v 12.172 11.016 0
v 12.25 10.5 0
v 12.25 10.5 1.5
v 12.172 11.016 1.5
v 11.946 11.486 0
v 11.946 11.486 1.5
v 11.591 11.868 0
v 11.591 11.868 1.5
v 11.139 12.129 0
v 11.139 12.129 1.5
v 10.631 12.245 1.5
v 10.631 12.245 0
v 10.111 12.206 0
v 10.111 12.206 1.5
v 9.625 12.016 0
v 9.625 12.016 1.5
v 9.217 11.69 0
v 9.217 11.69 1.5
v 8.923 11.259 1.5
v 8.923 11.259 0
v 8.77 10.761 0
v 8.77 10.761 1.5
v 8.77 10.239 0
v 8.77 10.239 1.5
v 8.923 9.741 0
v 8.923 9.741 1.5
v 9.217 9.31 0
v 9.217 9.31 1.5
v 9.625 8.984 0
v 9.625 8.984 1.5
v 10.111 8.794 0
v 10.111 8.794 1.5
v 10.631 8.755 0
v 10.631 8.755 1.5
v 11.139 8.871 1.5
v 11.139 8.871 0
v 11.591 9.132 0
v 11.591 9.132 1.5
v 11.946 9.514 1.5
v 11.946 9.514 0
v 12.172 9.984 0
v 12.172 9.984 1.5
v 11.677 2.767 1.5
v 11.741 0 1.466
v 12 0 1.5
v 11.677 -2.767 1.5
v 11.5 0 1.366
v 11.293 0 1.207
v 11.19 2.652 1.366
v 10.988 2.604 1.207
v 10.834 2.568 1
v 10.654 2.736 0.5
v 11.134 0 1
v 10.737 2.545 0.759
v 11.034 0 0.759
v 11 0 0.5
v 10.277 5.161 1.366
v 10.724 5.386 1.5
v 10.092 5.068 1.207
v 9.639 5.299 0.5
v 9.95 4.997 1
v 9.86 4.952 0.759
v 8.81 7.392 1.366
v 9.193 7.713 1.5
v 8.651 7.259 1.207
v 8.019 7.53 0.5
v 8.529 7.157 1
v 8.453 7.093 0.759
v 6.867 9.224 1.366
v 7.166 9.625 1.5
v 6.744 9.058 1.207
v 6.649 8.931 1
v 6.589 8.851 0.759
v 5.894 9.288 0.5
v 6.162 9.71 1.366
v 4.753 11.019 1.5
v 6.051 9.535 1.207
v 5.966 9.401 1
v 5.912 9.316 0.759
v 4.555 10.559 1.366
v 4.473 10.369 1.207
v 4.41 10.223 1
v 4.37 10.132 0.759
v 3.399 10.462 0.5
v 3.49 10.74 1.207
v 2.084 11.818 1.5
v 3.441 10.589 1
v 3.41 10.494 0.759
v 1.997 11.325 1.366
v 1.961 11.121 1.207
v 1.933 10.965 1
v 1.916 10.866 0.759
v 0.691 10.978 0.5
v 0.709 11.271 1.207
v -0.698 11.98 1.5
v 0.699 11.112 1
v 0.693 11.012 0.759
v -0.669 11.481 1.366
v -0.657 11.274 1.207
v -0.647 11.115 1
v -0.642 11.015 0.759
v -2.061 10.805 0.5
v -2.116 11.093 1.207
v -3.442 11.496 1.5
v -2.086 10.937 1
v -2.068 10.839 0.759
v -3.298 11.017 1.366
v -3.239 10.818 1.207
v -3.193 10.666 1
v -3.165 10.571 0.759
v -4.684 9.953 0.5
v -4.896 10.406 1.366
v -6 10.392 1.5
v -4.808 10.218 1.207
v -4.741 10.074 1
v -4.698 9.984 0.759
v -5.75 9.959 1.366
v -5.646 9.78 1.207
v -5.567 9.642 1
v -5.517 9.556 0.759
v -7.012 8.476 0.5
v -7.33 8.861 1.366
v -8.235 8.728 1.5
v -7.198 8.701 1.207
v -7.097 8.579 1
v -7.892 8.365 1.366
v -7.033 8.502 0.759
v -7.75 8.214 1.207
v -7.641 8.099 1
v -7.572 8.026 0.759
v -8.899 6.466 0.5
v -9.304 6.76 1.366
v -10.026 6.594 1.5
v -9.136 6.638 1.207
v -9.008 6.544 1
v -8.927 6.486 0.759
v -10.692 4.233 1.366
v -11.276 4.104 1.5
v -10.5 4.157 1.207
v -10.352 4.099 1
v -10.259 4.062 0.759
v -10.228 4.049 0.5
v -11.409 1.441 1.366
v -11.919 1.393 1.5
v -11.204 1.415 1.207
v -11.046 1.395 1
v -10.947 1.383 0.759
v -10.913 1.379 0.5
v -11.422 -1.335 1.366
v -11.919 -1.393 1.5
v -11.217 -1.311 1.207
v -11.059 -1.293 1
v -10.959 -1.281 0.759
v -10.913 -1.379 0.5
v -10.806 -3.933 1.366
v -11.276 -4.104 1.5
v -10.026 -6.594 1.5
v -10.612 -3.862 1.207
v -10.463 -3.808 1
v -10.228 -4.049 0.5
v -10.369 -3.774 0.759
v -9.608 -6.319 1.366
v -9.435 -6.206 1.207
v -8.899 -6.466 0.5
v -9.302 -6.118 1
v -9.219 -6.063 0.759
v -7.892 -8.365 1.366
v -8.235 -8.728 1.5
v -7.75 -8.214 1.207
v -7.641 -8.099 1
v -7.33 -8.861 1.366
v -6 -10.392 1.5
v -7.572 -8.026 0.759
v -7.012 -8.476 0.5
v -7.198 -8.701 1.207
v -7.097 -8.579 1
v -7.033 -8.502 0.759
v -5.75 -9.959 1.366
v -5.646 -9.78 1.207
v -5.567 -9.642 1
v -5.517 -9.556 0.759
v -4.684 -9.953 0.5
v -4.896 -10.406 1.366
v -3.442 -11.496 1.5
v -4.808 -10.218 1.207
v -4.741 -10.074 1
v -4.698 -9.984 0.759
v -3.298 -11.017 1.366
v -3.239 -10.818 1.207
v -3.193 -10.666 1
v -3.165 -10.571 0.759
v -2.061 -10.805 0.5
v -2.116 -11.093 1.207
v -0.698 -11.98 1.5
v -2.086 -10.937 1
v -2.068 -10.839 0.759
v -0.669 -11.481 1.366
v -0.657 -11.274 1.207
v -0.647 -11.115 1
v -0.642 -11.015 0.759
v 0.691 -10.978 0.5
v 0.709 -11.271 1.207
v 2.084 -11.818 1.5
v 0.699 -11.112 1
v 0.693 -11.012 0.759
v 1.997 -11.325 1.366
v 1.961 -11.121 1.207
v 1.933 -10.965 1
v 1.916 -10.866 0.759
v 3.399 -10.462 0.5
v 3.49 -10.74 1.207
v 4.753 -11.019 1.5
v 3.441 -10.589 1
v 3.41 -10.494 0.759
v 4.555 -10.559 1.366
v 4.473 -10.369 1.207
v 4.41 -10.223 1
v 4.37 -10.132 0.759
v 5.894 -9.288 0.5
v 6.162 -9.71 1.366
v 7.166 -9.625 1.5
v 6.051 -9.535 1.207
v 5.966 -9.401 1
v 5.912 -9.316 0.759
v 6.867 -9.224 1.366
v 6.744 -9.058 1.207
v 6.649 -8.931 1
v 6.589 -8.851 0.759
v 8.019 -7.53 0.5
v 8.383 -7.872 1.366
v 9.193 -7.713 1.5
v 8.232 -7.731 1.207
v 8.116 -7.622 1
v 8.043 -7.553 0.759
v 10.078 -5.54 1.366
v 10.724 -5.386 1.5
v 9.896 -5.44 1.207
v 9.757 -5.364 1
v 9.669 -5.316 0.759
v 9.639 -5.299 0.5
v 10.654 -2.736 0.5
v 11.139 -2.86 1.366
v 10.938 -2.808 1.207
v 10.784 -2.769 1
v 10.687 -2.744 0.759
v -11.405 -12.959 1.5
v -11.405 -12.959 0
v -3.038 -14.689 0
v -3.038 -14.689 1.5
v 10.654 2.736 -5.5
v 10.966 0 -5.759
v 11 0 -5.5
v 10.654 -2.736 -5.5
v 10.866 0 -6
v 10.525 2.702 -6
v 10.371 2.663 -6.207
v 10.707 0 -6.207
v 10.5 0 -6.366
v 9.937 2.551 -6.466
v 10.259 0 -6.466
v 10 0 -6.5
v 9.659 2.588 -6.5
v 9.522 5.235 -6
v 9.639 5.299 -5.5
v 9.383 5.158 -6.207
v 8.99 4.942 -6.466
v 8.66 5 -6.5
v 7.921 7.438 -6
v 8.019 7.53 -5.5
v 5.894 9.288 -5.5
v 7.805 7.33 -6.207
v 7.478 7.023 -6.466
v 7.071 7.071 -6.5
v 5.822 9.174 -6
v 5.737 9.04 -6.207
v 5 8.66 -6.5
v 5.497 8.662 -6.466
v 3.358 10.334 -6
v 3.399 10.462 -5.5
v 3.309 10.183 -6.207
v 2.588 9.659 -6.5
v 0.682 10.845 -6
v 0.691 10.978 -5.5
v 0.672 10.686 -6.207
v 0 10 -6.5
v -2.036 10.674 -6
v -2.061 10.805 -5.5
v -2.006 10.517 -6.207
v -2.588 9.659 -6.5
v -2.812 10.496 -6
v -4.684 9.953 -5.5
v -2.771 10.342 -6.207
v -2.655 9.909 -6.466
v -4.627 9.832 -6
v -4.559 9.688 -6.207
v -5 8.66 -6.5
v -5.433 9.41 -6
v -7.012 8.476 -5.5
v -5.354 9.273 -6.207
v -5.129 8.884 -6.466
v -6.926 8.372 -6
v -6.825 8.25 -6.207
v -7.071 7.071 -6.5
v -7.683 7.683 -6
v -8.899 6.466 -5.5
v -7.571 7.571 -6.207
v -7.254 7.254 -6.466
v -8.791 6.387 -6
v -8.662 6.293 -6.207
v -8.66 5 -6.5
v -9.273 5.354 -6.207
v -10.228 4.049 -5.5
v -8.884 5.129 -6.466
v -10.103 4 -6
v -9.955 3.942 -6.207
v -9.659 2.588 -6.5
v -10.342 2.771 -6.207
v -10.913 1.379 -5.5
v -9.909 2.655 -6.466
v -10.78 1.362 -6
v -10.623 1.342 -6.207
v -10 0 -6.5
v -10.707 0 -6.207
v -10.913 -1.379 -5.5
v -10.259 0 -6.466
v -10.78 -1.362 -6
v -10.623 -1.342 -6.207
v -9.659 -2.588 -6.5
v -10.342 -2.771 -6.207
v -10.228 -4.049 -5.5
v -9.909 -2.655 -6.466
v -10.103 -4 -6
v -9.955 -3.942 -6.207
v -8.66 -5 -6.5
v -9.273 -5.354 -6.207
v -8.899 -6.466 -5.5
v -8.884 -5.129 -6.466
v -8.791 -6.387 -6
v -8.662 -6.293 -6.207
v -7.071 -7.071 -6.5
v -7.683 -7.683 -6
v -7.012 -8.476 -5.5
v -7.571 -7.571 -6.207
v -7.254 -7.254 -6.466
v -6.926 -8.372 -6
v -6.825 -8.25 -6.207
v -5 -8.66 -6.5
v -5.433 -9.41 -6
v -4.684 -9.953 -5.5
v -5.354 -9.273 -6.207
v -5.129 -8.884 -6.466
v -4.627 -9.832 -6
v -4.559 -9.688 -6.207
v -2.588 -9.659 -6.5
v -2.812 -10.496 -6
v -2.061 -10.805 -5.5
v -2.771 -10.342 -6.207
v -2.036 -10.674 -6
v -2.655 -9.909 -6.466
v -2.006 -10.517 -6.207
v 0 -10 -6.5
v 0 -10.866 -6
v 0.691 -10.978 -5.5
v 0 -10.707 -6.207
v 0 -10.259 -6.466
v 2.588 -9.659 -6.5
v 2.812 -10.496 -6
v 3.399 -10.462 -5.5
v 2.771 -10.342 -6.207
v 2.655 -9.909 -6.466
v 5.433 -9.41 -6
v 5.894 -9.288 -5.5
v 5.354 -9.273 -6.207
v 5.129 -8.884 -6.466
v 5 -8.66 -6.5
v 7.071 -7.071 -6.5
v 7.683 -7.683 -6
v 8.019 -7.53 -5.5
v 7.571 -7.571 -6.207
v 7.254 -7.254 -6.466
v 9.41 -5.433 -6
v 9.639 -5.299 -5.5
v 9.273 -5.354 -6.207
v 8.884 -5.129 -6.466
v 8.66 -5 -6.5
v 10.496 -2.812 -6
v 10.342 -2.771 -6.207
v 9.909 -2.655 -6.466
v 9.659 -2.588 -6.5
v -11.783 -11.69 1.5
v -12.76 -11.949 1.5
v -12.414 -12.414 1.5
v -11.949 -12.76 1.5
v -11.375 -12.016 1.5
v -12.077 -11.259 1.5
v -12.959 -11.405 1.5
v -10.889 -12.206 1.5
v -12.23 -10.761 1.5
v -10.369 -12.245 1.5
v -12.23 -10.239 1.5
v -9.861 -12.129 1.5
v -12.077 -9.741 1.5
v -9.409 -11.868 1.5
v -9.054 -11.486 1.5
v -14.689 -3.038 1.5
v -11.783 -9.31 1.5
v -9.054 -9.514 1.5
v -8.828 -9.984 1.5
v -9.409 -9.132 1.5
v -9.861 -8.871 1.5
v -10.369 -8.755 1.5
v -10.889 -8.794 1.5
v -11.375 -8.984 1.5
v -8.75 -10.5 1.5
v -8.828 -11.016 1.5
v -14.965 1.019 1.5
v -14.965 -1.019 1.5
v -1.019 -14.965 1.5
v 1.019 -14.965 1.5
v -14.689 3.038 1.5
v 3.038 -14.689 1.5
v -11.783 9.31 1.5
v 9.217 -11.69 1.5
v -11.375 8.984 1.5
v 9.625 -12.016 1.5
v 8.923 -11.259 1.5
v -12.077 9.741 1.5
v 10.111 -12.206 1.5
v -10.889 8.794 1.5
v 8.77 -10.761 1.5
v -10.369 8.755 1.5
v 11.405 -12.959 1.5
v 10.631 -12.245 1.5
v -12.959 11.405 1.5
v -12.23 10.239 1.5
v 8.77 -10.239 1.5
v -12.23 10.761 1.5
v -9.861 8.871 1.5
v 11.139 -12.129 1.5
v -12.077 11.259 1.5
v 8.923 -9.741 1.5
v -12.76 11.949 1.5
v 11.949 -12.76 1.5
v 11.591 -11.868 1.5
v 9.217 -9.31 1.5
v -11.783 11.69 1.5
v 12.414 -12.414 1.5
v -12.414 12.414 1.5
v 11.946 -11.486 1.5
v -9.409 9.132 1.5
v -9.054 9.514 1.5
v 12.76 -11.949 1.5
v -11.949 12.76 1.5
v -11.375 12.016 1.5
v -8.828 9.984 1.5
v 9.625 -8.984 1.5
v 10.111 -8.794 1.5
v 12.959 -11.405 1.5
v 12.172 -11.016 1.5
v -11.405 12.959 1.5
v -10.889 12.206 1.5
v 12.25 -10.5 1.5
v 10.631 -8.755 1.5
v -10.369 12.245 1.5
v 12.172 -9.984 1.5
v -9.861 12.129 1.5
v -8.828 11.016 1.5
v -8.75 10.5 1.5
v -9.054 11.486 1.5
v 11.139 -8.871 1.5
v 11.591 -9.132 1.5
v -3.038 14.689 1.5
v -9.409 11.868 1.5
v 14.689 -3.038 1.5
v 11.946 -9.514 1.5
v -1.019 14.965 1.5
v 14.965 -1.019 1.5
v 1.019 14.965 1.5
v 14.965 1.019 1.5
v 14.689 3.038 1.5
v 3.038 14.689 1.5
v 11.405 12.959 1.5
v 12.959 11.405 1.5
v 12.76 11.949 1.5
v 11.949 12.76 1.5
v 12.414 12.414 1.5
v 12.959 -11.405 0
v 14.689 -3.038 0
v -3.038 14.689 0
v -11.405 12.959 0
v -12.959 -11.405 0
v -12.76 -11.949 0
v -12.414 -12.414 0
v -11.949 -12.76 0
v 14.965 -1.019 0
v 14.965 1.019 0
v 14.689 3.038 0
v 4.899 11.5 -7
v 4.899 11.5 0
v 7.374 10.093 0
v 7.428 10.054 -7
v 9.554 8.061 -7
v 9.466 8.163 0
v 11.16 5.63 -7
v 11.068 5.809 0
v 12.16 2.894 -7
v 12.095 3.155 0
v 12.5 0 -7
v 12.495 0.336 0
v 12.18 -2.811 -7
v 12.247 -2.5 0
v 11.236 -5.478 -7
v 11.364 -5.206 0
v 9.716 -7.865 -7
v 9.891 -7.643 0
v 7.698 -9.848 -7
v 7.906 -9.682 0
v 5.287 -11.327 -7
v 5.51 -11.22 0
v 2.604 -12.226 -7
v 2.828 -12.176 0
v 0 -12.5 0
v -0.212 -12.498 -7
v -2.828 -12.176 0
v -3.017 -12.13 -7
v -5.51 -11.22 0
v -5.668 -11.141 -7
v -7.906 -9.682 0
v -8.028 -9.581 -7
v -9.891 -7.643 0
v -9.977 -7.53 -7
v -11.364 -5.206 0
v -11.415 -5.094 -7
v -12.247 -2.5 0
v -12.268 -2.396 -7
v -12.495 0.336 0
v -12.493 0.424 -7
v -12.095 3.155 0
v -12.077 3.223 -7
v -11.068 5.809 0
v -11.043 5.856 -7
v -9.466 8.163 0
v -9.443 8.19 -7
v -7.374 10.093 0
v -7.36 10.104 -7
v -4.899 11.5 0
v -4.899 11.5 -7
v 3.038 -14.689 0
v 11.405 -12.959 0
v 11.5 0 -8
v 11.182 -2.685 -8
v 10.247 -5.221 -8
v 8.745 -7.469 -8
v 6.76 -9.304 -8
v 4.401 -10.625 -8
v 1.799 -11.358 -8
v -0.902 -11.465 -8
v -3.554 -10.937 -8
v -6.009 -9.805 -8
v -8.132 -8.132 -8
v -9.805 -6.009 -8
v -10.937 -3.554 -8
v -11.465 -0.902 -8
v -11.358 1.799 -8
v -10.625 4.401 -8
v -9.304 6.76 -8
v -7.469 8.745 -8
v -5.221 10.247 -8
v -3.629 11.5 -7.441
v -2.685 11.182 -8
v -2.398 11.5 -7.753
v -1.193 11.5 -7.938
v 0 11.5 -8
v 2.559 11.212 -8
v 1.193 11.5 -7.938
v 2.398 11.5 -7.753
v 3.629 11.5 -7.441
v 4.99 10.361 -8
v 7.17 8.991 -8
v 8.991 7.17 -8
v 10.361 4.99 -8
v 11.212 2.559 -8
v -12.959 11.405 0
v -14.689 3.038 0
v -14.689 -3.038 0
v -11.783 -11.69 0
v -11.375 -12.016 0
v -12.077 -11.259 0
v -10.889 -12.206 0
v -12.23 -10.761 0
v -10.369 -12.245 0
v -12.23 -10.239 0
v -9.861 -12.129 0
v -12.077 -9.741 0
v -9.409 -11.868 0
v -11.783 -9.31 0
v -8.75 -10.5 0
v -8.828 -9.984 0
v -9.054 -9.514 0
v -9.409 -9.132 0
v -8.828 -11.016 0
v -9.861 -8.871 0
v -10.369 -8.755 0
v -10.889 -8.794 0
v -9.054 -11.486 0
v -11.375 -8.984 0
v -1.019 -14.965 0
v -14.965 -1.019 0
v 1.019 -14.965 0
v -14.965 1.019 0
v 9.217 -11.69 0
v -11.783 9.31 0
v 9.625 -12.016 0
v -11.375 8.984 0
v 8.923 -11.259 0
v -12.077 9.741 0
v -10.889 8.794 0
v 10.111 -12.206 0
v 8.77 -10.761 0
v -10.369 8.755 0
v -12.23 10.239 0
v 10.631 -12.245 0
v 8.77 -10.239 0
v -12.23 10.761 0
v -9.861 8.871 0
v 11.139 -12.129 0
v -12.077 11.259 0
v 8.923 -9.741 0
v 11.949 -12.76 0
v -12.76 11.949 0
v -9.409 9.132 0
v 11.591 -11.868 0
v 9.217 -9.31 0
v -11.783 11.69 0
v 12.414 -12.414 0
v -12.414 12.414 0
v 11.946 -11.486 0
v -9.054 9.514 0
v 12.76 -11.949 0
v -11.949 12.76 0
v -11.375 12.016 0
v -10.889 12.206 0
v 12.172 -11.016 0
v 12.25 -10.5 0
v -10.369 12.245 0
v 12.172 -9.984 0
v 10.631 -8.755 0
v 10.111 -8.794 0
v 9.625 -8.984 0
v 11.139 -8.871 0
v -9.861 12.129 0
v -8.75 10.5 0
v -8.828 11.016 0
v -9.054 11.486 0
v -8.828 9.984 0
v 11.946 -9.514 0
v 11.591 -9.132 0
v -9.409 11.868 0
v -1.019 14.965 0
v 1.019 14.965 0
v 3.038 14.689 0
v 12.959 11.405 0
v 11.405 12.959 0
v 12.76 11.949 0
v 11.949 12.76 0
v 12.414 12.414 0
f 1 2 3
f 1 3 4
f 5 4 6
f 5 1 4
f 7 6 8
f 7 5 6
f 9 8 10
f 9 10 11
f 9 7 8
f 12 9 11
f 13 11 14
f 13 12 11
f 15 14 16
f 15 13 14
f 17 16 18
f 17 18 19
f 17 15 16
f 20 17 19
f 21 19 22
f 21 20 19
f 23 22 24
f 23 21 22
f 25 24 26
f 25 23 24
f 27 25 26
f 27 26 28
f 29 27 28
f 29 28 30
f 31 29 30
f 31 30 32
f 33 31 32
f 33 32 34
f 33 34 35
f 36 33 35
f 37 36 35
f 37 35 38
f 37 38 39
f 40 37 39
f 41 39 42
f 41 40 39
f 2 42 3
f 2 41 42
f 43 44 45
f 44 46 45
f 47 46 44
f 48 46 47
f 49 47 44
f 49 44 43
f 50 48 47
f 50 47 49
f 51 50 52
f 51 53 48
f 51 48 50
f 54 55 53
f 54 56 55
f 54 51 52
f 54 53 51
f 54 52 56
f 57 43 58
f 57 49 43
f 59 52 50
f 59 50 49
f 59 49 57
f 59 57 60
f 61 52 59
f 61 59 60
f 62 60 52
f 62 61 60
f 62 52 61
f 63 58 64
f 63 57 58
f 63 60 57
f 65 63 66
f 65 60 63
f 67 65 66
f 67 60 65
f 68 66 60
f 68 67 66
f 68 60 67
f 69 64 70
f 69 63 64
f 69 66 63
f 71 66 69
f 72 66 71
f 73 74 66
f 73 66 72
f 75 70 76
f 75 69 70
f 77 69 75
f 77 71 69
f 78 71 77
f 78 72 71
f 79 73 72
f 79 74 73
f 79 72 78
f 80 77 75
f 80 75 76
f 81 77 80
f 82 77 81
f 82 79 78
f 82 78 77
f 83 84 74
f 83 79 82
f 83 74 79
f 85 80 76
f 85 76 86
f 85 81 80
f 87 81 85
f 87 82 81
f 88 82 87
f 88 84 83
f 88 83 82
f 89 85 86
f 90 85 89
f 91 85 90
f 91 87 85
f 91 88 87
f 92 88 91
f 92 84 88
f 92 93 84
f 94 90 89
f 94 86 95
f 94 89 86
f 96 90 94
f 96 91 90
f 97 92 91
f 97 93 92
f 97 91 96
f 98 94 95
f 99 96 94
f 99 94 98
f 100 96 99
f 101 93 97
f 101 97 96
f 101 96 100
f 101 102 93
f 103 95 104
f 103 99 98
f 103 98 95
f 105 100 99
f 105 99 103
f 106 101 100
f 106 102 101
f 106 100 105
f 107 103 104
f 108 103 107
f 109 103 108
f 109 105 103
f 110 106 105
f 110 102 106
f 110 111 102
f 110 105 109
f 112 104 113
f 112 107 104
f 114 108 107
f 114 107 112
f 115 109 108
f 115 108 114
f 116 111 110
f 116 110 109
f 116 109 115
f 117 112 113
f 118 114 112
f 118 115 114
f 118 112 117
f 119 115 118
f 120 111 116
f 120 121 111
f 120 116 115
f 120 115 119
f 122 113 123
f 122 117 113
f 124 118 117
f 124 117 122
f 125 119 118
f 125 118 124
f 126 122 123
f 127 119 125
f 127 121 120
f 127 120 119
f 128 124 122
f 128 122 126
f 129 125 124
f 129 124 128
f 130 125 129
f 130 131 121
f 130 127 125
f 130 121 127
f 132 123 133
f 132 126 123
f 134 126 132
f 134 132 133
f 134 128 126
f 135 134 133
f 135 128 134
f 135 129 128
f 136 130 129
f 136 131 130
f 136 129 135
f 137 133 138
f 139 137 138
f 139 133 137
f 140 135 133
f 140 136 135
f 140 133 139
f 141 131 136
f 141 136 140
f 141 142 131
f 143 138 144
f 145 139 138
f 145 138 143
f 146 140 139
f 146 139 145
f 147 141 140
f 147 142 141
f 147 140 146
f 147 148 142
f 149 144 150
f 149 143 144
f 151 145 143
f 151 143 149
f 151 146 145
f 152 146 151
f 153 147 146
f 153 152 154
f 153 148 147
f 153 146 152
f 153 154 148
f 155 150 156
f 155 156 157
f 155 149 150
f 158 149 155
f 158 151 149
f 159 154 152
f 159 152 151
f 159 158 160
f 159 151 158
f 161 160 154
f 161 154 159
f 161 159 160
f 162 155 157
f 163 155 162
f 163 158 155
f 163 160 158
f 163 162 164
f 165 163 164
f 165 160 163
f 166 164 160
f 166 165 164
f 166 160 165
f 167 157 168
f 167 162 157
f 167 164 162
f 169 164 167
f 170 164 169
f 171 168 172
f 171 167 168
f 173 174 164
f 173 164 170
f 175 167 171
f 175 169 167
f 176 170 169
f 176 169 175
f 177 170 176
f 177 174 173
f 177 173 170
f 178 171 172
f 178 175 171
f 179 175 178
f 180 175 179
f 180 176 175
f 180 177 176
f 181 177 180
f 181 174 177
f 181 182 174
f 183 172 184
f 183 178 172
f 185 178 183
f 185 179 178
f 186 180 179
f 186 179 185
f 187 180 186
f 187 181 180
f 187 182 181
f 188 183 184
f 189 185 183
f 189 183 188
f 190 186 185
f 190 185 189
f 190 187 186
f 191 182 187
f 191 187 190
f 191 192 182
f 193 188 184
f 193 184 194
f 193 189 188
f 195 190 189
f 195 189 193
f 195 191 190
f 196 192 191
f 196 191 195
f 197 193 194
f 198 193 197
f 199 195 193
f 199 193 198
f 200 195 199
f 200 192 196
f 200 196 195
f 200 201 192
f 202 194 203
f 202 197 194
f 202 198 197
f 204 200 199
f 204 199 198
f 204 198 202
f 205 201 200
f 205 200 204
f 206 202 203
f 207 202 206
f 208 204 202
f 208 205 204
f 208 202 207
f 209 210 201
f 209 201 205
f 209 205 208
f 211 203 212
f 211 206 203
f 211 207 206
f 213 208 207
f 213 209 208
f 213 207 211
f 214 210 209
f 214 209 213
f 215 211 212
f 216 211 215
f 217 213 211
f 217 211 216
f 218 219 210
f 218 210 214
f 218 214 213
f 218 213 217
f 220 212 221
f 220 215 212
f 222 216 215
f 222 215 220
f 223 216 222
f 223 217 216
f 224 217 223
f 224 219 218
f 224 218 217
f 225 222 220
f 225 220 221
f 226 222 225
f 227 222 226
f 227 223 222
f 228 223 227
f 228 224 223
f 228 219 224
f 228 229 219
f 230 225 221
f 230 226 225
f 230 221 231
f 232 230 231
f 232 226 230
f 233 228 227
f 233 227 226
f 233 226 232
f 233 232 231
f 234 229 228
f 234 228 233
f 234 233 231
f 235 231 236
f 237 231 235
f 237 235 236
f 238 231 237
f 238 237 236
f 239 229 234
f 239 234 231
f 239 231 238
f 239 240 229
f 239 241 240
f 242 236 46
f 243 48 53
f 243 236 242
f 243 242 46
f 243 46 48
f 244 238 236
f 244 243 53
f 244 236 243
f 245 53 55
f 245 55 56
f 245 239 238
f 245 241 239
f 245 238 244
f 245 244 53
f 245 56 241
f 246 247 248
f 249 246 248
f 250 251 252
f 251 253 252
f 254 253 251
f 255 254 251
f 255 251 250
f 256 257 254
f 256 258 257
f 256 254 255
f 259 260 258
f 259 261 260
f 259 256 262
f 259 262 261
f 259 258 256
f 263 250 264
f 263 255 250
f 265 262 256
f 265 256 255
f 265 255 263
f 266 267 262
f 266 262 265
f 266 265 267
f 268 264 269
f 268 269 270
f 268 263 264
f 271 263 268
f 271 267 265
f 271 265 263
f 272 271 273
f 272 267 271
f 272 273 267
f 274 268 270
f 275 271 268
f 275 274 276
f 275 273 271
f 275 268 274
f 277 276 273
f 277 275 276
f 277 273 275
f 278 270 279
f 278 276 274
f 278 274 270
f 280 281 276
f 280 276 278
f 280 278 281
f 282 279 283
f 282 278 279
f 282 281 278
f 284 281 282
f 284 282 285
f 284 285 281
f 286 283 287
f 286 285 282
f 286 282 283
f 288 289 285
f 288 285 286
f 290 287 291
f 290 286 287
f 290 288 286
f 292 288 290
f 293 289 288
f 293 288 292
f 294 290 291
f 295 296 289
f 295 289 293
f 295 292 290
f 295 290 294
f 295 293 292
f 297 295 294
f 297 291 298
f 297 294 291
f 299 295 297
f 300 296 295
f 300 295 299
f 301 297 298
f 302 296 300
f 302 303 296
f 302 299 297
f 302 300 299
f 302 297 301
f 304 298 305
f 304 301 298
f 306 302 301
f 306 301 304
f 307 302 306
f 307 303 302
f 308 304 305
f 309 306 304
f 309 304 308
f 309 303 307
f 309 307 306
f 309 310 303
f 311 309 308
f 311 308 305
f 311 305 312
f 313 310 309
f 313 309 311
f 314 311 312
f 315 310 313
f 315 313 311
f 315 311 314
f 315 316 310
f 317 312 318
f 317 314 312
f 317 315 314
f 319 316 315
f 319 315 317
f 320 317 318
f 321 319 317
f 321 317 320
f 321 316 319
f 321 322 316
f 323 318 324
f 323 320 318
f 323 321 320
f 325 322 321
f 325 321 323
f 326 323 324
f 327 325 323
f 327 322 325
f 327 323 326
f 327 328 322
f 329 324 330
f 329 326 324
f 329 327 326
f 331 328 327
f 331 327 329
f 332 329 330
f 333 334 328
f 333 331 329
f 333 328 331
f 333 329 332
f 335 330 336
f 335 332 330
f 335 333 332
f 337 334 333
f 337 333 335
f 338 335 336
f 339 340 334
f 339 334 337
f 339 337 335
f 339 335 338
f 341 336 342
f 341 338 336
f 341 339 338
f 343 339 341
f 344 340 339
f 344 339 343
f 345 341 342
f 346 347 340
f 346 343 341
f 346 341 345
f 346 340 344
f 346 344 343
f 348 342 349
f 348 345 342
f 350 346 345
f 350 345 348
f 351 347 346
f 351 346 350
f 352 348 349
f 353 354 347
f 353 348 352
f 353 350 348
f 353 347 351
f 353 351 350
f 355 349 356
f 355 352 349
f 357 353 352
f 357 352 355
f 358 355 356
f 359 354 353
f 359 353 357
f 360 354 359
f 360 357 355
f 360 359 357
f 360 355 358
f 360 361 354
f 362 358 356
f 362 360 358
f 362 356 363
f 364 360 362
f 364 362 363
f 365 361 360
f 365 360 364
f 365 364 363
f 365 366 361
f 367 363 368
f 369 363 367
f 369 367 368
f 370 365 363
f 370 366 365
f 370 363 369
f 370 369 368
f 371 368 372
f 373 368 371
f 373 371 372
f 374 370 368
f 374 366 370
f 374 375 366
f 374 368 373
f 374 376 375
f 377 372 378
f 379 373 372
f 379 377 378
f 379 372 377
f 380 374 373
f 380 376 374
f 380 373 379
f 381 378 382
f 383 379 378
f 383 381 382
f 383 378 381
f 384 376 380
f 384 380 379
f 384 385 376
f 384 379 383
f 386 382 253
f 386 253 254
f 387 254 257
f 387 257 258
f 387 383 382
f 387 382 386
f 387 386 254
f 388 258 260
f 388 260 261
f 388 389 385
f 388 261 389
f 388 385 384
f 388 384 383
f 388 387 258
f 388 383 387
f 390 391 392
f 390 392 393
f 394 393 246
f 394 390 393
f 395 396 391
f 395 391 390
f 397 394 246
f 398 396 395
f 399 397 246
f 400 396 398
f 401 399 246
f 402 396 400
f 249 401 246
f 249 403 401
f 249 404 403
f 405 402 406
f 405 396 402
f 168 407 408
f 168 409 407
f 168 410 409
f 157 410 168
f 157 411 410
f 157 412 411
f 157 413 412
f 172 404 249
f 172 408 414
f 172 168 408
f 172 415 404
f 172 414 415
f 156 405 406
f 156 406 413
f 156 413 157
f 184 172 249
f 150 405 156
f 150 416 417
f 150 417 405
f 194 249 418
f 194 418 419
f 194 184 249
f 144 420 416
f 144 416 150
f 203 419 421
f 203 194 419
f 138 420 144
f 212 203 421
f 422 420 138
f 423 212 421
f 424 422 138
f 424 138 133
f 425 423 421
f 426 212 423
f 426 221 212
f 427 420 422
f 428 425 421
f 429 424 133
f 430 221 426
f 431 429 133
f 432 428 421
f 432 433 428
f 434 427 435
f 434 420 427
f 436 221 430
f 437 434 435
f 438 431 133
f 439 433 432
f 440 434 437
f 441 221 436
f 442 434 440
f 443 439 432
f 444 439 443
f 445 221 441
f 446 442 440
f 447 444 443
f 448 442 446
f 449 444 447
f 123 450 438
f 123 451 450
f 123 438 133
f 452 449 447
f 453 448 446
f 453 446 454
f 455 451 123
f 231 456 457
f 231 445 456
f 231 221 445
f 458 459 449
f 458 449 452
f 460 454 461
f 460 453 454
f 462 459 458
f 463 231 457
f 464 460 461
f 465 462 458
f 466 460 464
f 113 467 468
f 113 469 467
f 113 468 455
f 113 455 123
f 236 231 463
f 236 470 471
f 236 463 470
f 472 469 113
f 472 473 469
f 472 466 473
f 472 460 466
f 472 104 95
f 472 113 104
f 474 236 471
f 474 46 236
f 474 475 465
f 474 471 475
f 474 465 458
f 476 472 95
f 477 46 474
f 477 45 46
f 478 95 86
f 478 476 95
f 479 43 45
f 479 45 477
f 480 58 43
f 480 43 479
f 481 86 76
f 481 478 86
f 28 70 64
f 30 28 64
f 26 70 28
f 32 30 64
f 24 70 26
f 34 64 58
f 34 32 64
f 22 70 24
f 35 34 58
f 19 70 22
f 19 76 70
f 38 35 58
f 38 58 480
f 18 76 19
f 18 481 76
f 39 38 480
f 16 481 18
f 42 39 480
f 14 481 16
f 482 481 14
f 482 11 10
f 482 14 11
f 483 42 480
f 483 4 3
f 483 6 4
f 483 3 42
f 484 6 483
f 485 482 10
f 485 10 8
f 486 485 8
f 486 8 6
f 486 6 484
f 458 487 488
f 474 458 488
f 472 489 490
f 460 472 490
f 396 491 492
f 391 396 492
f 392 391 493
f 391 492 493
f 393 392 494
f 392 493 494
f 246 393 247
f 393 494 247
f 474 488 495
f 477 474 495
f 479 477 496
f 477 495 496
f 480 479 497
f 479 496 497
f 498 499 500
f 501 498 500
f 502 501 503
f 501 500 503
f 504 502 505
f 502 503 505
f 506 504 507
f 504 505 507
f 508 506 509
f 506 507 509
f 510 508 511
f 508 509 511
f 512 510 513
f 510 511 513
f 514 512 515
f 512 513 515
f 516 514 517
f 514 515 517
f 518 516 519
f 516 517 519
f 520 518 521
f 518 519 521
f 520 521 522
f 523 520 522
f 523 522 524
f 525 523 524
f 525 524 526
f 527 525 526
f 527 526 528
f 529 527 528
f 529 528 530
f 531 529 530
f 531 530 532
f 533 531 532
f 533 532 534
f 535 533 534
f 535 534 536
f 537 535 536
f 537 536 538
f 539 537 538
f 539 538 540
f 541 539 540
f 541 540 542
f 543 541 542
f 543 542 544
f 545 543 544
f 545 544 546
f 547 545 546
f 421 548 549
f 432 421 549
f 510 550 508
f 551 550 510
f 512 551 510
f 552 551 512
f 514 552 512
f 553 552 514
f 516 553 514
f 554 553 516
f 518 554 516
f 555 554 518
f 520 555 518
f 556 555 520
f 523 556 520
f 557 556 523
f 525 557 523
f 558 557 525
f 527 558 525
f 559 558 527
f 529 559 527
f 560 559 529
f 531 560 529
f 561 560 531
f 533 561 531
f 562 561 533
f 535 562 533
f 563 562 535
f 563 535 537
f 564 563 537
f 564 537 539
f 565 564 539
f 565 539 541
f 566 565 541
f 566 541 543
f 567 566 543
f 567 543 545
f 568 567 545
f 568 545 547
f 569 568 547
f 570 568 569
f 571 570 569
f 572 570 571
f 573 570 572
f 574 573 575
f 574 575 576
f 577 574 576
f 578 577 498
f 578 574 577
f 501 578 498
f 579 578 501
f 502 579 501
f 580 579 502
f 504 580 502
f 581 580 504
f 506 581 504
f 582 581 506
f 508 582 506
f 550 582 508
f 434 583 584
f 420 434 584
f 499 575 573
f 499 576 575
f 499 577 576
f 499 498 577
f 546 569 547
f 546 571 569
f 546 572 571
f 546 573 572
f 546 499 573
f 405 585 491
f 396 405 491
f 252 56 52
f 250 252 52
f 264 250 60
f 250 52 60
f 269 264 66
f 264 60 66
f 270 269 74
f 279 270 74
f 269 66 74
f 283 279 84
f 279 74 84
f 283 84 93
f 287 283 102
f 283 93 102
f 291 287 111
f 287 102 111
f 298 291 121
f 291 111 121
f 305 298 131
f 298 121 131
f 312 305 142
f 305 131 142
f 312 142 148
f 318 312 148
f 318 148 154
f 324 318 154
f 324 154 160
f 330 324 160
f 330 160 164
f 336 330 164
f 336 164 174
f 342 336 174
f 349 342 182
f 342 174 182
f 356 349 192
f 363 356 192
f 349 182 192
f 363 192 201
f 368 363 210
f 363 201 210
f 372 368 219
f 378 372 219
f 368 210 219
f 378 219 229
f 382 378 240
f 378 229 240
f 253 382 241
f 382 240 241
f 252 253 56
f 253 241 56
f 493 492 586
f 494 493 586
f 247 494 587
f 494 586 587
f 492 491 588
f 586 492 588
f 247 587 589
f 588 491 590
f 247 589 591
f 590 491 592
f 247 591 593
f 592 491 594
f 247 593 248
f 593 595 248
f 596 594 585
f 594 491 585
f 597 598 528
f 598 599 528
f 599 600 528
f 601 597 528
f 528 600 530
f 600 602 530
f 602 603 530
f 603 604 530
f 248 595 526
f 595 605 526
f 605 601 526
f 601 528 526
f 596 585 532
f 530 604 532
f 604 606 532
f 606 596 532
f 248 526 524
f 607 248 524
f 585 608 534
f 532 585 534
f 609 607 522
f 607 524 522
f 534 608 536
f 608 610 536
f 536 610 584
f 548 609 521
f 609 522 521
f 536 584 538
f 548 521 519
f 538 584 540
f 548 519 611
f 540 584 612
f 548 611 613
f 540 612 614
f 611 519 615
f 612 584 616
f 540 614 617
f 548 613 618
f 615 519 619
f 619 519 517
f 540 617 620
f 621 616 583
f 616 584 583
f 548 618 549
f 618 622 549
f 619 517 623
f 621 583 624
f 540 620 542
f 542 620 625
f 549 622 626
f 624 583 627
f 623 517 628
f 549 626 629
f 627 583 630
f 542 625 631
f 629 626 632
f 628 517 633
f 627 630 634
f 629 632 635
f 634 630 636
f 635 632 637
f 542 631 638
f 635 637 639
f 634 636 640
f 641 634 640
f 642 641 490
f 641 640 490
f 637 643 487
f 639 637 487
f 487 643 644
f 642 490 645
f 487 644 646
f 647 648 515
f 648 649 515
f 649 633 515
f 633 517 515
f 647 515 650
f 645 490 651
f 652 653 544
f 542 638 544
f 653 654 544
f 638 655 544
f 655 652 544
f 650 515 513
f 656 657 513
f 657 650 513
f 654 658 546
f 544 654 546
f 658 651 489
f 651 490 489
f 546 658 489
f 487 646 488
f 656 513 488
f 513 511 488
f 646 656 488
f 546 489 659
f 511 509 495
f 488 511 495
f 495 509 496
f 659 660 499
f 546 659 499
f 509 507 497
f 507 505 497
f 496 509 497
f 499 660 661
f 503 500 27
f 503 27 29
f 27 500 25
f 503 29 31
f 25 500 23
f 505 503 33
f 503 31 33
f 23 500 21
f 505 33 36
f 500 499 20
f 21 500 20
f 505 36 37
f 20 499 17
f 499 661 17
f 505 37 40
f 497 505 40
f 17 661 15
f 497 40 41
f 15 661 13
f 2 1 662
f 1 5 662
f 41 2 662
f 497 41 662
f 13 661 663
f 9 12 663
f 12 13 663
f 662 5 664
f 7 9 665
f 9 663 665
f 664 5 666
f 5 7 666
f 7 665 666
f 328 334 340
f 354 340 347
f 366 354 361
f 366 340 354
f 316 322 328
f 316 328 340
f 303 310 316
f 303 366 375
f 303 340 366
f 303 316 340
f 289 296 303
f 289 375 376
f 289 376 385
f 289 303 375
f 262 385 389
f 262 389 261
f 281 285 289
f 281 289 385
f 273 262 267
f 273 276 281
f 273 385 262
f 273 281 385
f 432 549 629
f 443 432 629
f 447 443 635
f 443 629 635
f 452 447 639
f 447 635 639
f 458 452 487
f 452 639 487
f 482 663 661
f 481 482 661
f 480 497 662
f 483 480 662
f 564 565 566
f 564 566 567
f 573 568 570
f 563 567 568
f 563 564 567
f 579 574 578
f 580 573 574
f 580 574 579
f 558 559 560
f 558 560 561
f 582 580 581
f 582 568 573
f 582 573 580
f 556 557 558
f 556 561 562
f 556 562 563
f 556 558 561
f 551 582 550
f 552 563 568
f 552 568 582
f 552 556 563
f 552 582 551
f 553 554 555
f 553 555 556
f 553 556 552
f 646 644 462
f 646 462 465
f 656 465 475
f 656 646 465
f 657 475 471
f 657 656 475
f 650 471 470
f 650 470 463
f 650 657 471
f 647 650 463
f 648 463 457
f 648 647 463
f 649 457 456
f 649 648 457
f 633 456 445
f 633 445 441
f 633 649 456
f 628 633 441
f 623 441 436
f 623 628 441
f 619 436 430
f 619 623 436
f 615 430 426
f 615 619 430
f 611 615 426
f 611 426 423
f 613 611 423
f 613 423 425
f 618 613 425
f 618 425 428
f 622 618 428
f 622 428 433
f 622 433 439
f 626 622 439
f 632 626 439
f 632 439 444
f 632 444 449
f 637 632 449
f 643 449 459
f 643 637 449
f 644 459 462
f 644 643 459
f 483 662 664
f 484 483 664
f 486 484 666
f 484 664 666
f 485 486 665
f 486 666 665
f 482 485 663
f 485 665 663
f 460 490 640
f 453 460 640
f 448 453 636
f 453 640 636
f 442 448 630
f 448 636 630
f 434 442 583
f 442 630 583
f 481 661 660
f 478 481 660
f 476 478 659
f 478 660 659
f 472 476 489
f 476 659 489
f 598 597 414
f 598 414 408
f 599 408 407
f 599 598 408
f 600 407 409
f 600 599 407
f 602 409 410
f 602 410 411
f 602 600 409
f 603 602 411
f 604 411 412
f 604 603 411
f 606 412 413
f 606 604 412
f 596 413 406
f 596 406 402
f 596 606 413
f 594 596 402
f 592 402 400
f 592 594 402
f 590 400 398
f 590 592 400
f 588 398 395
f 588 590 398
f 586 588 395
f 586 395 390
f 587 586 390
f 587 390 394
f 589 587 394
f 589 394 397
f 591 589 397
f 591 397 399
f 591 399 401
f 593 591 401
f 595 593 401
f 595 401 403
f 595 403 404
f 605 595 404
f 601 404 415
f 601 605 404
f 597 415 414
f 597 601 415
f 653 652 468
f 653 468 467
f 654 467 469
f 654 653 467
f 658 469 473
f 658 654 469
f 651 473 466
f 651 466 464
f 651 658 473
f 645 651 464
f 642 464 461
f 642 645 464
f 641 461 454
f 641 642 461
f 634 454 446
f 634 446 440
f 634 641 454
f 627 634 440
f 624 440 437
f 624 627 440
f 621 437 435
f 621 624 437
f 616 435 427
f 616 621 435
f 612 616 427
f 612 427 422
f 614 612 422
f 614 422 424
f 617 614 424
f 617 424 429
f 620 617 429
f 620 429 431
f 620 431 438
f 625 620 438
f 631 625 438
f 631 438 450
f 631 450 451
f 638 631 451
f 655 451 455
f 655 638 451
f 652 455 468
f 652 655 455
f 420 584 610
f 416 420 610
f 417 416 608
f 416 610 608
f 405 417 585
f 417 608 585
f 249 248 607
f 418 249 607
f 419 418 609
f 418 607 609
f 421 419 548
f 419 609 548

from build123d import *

# Parameters (mm, degrees)
ESQUISSE1_R             = 1.75
BASE_EXTRUSION_DEPTH    = 1.5
ESQUISSE2_R             = 12.5
BOSS_EXTRU_1_DEPTH      = 8
CHANFREIN1_SIZE         = 1
ESQUISSE3_R             = 11
ENL_V_MAT_EXTRU_1_DEPTH = 8
CONG_1_R                = 1
ESQUISSE4_W             = 15.143469624
ESQUISSE4_H             = 5.581450233
ENL_V_MAT_EXTRU_3_DEPTH = 8


with BuildPart() as part:
    # Esquisse1 → Base-Extrusion (new body)
    with BuildSketch(Plane.XY):
        with BuildLine():
            Line((-11.405090569, -12.958545795), (-3.038179265, -14.689093463))
            ThreePointArc((-3.038179265, -14.689093463), (0, -15), (3.038179265, -14.689093463))
            Line((3.038179265, -14.689093463), (11.405090569, -12.958545795))
            ThreePointArc((11.405090569, -12.958545795), (12.414213562, -12.414213562), (12.958545795, -11.405090569))
            Line((12.958545795, -11.405090569), (14.689093463, -3.038179265))
            ThreePointArc((14.689093463, -3.038179265), (15, 0), (14.689093463, 3.038179265))
            Line((14.689093463, 3.038179265), (12.958545795, 11.405090569))
            ThreePointArc((12.958545795, 11.405090569), (12.414213562, 12.414213562), (11.405090569, 12.958545795))
            Line((11.405090569, 12.958545795), (3.038179265, 14.689093463))
            ThreePointArc((3.038179265, 14.689093463), (0, 15), (-3.038179265, 14.689093463))
            Line((-3.038179265, 14.689093463), (-11.405090569, 12.958545795))
            ThreePointArc((-11.405090569, 12.958545795), (-12.414213562, 12.414213562), (-12.958545795, 11.405090569))
            Line((-12.958545795, 11.405090569), (-14.689093463, 3.038179265))
            ThreePointArc((-14.689093463, 3.038179265), (-15, 0), (-14.689093463, -3.038179265))
            Line((-14.689093463, -3.038179265), (-12.958545795, -11.405090569))
            ThreePointArc((-12.958545795, -11.405090569), (-12.414213562, -12.414213562), (-11.405090569, -12.958545795))
        make_face()
        with Locations((-10.5, 10.5)):
            Circle(ESQUISSE1_R, mode=Mode.SUBTRACT)
        with Locations((10.5, 10.5)):
            Circle(ESQUISSE1_R, mode=Mode.SUBTRACT)
        with Locations((-10.5, -10.5)):
            Circle(ESQUISSE1_R, mode=Mode.SUBTRACT)
        with Locations((10.5, -10.5)):
            Circle(ESQUISSE1_R, mode=Mode.SUBTRACT)
    extrude(amount=BASE_EXTRUSION_DEPTH)

    # Esquisse2 → Boss.-Extru.1 (add)
    with BuildSketch(Plane(origin=(0, 0, 0), x_dir=(-1, 0, 0), z_dir=(0, 0, -1))):
        with Locations(Location((0, 0, 0), (0, 0, 180))):
            Circle(ESQUISSE2_R)
    extrude(amount=BOSS_EXTRU_1_DEPTH)

    # Chanfrein1
    chanfrein1_edges = [part.edges().sort_by_distance(p)[0] for p in [
        (-12.5, 0, -8),
    ]]
    chamfer(chanfrein1_edges, length=CHANFREIN1_SIZE)

    # Esquisse3 → Enlèv. mat.-Extru.1 (cut)
    with BuildSketch(Plane.XY.offset(1.5)):
        Circle(ESQUISSE3_R)
    extrude(amount=-ENL_V_MAT_EXTRU_1_DEPTH, mode=Mode.SUBTRACT)

    # Congé1
    cong_1_edges = [part.edges().sort_by_distance(p)[0] for p in [
        (-11, 0, -6.5),
        (-11, 0, 1.5),
    ]]
    fillet(cong_1_edges, radius=CONG_1_R)

    # Esquisse4 → Enlèv. mat.-Extru.3 (cut)
    with BuildSketch(Plane(origin=(0, 0, 0), x_dir=(-1, 0, 0), z_dir=(0, 0, -1))):
        with Locations((-0.10816764, 14.290725117)):
            Rectangle(ESQUISSE4_W, ESQUISSE4_H)
    extrude(amount=ENL_V_MAT_EXTRU_3_DEPTH, mode=Mode.SUBTRACT)


solid = part.part
